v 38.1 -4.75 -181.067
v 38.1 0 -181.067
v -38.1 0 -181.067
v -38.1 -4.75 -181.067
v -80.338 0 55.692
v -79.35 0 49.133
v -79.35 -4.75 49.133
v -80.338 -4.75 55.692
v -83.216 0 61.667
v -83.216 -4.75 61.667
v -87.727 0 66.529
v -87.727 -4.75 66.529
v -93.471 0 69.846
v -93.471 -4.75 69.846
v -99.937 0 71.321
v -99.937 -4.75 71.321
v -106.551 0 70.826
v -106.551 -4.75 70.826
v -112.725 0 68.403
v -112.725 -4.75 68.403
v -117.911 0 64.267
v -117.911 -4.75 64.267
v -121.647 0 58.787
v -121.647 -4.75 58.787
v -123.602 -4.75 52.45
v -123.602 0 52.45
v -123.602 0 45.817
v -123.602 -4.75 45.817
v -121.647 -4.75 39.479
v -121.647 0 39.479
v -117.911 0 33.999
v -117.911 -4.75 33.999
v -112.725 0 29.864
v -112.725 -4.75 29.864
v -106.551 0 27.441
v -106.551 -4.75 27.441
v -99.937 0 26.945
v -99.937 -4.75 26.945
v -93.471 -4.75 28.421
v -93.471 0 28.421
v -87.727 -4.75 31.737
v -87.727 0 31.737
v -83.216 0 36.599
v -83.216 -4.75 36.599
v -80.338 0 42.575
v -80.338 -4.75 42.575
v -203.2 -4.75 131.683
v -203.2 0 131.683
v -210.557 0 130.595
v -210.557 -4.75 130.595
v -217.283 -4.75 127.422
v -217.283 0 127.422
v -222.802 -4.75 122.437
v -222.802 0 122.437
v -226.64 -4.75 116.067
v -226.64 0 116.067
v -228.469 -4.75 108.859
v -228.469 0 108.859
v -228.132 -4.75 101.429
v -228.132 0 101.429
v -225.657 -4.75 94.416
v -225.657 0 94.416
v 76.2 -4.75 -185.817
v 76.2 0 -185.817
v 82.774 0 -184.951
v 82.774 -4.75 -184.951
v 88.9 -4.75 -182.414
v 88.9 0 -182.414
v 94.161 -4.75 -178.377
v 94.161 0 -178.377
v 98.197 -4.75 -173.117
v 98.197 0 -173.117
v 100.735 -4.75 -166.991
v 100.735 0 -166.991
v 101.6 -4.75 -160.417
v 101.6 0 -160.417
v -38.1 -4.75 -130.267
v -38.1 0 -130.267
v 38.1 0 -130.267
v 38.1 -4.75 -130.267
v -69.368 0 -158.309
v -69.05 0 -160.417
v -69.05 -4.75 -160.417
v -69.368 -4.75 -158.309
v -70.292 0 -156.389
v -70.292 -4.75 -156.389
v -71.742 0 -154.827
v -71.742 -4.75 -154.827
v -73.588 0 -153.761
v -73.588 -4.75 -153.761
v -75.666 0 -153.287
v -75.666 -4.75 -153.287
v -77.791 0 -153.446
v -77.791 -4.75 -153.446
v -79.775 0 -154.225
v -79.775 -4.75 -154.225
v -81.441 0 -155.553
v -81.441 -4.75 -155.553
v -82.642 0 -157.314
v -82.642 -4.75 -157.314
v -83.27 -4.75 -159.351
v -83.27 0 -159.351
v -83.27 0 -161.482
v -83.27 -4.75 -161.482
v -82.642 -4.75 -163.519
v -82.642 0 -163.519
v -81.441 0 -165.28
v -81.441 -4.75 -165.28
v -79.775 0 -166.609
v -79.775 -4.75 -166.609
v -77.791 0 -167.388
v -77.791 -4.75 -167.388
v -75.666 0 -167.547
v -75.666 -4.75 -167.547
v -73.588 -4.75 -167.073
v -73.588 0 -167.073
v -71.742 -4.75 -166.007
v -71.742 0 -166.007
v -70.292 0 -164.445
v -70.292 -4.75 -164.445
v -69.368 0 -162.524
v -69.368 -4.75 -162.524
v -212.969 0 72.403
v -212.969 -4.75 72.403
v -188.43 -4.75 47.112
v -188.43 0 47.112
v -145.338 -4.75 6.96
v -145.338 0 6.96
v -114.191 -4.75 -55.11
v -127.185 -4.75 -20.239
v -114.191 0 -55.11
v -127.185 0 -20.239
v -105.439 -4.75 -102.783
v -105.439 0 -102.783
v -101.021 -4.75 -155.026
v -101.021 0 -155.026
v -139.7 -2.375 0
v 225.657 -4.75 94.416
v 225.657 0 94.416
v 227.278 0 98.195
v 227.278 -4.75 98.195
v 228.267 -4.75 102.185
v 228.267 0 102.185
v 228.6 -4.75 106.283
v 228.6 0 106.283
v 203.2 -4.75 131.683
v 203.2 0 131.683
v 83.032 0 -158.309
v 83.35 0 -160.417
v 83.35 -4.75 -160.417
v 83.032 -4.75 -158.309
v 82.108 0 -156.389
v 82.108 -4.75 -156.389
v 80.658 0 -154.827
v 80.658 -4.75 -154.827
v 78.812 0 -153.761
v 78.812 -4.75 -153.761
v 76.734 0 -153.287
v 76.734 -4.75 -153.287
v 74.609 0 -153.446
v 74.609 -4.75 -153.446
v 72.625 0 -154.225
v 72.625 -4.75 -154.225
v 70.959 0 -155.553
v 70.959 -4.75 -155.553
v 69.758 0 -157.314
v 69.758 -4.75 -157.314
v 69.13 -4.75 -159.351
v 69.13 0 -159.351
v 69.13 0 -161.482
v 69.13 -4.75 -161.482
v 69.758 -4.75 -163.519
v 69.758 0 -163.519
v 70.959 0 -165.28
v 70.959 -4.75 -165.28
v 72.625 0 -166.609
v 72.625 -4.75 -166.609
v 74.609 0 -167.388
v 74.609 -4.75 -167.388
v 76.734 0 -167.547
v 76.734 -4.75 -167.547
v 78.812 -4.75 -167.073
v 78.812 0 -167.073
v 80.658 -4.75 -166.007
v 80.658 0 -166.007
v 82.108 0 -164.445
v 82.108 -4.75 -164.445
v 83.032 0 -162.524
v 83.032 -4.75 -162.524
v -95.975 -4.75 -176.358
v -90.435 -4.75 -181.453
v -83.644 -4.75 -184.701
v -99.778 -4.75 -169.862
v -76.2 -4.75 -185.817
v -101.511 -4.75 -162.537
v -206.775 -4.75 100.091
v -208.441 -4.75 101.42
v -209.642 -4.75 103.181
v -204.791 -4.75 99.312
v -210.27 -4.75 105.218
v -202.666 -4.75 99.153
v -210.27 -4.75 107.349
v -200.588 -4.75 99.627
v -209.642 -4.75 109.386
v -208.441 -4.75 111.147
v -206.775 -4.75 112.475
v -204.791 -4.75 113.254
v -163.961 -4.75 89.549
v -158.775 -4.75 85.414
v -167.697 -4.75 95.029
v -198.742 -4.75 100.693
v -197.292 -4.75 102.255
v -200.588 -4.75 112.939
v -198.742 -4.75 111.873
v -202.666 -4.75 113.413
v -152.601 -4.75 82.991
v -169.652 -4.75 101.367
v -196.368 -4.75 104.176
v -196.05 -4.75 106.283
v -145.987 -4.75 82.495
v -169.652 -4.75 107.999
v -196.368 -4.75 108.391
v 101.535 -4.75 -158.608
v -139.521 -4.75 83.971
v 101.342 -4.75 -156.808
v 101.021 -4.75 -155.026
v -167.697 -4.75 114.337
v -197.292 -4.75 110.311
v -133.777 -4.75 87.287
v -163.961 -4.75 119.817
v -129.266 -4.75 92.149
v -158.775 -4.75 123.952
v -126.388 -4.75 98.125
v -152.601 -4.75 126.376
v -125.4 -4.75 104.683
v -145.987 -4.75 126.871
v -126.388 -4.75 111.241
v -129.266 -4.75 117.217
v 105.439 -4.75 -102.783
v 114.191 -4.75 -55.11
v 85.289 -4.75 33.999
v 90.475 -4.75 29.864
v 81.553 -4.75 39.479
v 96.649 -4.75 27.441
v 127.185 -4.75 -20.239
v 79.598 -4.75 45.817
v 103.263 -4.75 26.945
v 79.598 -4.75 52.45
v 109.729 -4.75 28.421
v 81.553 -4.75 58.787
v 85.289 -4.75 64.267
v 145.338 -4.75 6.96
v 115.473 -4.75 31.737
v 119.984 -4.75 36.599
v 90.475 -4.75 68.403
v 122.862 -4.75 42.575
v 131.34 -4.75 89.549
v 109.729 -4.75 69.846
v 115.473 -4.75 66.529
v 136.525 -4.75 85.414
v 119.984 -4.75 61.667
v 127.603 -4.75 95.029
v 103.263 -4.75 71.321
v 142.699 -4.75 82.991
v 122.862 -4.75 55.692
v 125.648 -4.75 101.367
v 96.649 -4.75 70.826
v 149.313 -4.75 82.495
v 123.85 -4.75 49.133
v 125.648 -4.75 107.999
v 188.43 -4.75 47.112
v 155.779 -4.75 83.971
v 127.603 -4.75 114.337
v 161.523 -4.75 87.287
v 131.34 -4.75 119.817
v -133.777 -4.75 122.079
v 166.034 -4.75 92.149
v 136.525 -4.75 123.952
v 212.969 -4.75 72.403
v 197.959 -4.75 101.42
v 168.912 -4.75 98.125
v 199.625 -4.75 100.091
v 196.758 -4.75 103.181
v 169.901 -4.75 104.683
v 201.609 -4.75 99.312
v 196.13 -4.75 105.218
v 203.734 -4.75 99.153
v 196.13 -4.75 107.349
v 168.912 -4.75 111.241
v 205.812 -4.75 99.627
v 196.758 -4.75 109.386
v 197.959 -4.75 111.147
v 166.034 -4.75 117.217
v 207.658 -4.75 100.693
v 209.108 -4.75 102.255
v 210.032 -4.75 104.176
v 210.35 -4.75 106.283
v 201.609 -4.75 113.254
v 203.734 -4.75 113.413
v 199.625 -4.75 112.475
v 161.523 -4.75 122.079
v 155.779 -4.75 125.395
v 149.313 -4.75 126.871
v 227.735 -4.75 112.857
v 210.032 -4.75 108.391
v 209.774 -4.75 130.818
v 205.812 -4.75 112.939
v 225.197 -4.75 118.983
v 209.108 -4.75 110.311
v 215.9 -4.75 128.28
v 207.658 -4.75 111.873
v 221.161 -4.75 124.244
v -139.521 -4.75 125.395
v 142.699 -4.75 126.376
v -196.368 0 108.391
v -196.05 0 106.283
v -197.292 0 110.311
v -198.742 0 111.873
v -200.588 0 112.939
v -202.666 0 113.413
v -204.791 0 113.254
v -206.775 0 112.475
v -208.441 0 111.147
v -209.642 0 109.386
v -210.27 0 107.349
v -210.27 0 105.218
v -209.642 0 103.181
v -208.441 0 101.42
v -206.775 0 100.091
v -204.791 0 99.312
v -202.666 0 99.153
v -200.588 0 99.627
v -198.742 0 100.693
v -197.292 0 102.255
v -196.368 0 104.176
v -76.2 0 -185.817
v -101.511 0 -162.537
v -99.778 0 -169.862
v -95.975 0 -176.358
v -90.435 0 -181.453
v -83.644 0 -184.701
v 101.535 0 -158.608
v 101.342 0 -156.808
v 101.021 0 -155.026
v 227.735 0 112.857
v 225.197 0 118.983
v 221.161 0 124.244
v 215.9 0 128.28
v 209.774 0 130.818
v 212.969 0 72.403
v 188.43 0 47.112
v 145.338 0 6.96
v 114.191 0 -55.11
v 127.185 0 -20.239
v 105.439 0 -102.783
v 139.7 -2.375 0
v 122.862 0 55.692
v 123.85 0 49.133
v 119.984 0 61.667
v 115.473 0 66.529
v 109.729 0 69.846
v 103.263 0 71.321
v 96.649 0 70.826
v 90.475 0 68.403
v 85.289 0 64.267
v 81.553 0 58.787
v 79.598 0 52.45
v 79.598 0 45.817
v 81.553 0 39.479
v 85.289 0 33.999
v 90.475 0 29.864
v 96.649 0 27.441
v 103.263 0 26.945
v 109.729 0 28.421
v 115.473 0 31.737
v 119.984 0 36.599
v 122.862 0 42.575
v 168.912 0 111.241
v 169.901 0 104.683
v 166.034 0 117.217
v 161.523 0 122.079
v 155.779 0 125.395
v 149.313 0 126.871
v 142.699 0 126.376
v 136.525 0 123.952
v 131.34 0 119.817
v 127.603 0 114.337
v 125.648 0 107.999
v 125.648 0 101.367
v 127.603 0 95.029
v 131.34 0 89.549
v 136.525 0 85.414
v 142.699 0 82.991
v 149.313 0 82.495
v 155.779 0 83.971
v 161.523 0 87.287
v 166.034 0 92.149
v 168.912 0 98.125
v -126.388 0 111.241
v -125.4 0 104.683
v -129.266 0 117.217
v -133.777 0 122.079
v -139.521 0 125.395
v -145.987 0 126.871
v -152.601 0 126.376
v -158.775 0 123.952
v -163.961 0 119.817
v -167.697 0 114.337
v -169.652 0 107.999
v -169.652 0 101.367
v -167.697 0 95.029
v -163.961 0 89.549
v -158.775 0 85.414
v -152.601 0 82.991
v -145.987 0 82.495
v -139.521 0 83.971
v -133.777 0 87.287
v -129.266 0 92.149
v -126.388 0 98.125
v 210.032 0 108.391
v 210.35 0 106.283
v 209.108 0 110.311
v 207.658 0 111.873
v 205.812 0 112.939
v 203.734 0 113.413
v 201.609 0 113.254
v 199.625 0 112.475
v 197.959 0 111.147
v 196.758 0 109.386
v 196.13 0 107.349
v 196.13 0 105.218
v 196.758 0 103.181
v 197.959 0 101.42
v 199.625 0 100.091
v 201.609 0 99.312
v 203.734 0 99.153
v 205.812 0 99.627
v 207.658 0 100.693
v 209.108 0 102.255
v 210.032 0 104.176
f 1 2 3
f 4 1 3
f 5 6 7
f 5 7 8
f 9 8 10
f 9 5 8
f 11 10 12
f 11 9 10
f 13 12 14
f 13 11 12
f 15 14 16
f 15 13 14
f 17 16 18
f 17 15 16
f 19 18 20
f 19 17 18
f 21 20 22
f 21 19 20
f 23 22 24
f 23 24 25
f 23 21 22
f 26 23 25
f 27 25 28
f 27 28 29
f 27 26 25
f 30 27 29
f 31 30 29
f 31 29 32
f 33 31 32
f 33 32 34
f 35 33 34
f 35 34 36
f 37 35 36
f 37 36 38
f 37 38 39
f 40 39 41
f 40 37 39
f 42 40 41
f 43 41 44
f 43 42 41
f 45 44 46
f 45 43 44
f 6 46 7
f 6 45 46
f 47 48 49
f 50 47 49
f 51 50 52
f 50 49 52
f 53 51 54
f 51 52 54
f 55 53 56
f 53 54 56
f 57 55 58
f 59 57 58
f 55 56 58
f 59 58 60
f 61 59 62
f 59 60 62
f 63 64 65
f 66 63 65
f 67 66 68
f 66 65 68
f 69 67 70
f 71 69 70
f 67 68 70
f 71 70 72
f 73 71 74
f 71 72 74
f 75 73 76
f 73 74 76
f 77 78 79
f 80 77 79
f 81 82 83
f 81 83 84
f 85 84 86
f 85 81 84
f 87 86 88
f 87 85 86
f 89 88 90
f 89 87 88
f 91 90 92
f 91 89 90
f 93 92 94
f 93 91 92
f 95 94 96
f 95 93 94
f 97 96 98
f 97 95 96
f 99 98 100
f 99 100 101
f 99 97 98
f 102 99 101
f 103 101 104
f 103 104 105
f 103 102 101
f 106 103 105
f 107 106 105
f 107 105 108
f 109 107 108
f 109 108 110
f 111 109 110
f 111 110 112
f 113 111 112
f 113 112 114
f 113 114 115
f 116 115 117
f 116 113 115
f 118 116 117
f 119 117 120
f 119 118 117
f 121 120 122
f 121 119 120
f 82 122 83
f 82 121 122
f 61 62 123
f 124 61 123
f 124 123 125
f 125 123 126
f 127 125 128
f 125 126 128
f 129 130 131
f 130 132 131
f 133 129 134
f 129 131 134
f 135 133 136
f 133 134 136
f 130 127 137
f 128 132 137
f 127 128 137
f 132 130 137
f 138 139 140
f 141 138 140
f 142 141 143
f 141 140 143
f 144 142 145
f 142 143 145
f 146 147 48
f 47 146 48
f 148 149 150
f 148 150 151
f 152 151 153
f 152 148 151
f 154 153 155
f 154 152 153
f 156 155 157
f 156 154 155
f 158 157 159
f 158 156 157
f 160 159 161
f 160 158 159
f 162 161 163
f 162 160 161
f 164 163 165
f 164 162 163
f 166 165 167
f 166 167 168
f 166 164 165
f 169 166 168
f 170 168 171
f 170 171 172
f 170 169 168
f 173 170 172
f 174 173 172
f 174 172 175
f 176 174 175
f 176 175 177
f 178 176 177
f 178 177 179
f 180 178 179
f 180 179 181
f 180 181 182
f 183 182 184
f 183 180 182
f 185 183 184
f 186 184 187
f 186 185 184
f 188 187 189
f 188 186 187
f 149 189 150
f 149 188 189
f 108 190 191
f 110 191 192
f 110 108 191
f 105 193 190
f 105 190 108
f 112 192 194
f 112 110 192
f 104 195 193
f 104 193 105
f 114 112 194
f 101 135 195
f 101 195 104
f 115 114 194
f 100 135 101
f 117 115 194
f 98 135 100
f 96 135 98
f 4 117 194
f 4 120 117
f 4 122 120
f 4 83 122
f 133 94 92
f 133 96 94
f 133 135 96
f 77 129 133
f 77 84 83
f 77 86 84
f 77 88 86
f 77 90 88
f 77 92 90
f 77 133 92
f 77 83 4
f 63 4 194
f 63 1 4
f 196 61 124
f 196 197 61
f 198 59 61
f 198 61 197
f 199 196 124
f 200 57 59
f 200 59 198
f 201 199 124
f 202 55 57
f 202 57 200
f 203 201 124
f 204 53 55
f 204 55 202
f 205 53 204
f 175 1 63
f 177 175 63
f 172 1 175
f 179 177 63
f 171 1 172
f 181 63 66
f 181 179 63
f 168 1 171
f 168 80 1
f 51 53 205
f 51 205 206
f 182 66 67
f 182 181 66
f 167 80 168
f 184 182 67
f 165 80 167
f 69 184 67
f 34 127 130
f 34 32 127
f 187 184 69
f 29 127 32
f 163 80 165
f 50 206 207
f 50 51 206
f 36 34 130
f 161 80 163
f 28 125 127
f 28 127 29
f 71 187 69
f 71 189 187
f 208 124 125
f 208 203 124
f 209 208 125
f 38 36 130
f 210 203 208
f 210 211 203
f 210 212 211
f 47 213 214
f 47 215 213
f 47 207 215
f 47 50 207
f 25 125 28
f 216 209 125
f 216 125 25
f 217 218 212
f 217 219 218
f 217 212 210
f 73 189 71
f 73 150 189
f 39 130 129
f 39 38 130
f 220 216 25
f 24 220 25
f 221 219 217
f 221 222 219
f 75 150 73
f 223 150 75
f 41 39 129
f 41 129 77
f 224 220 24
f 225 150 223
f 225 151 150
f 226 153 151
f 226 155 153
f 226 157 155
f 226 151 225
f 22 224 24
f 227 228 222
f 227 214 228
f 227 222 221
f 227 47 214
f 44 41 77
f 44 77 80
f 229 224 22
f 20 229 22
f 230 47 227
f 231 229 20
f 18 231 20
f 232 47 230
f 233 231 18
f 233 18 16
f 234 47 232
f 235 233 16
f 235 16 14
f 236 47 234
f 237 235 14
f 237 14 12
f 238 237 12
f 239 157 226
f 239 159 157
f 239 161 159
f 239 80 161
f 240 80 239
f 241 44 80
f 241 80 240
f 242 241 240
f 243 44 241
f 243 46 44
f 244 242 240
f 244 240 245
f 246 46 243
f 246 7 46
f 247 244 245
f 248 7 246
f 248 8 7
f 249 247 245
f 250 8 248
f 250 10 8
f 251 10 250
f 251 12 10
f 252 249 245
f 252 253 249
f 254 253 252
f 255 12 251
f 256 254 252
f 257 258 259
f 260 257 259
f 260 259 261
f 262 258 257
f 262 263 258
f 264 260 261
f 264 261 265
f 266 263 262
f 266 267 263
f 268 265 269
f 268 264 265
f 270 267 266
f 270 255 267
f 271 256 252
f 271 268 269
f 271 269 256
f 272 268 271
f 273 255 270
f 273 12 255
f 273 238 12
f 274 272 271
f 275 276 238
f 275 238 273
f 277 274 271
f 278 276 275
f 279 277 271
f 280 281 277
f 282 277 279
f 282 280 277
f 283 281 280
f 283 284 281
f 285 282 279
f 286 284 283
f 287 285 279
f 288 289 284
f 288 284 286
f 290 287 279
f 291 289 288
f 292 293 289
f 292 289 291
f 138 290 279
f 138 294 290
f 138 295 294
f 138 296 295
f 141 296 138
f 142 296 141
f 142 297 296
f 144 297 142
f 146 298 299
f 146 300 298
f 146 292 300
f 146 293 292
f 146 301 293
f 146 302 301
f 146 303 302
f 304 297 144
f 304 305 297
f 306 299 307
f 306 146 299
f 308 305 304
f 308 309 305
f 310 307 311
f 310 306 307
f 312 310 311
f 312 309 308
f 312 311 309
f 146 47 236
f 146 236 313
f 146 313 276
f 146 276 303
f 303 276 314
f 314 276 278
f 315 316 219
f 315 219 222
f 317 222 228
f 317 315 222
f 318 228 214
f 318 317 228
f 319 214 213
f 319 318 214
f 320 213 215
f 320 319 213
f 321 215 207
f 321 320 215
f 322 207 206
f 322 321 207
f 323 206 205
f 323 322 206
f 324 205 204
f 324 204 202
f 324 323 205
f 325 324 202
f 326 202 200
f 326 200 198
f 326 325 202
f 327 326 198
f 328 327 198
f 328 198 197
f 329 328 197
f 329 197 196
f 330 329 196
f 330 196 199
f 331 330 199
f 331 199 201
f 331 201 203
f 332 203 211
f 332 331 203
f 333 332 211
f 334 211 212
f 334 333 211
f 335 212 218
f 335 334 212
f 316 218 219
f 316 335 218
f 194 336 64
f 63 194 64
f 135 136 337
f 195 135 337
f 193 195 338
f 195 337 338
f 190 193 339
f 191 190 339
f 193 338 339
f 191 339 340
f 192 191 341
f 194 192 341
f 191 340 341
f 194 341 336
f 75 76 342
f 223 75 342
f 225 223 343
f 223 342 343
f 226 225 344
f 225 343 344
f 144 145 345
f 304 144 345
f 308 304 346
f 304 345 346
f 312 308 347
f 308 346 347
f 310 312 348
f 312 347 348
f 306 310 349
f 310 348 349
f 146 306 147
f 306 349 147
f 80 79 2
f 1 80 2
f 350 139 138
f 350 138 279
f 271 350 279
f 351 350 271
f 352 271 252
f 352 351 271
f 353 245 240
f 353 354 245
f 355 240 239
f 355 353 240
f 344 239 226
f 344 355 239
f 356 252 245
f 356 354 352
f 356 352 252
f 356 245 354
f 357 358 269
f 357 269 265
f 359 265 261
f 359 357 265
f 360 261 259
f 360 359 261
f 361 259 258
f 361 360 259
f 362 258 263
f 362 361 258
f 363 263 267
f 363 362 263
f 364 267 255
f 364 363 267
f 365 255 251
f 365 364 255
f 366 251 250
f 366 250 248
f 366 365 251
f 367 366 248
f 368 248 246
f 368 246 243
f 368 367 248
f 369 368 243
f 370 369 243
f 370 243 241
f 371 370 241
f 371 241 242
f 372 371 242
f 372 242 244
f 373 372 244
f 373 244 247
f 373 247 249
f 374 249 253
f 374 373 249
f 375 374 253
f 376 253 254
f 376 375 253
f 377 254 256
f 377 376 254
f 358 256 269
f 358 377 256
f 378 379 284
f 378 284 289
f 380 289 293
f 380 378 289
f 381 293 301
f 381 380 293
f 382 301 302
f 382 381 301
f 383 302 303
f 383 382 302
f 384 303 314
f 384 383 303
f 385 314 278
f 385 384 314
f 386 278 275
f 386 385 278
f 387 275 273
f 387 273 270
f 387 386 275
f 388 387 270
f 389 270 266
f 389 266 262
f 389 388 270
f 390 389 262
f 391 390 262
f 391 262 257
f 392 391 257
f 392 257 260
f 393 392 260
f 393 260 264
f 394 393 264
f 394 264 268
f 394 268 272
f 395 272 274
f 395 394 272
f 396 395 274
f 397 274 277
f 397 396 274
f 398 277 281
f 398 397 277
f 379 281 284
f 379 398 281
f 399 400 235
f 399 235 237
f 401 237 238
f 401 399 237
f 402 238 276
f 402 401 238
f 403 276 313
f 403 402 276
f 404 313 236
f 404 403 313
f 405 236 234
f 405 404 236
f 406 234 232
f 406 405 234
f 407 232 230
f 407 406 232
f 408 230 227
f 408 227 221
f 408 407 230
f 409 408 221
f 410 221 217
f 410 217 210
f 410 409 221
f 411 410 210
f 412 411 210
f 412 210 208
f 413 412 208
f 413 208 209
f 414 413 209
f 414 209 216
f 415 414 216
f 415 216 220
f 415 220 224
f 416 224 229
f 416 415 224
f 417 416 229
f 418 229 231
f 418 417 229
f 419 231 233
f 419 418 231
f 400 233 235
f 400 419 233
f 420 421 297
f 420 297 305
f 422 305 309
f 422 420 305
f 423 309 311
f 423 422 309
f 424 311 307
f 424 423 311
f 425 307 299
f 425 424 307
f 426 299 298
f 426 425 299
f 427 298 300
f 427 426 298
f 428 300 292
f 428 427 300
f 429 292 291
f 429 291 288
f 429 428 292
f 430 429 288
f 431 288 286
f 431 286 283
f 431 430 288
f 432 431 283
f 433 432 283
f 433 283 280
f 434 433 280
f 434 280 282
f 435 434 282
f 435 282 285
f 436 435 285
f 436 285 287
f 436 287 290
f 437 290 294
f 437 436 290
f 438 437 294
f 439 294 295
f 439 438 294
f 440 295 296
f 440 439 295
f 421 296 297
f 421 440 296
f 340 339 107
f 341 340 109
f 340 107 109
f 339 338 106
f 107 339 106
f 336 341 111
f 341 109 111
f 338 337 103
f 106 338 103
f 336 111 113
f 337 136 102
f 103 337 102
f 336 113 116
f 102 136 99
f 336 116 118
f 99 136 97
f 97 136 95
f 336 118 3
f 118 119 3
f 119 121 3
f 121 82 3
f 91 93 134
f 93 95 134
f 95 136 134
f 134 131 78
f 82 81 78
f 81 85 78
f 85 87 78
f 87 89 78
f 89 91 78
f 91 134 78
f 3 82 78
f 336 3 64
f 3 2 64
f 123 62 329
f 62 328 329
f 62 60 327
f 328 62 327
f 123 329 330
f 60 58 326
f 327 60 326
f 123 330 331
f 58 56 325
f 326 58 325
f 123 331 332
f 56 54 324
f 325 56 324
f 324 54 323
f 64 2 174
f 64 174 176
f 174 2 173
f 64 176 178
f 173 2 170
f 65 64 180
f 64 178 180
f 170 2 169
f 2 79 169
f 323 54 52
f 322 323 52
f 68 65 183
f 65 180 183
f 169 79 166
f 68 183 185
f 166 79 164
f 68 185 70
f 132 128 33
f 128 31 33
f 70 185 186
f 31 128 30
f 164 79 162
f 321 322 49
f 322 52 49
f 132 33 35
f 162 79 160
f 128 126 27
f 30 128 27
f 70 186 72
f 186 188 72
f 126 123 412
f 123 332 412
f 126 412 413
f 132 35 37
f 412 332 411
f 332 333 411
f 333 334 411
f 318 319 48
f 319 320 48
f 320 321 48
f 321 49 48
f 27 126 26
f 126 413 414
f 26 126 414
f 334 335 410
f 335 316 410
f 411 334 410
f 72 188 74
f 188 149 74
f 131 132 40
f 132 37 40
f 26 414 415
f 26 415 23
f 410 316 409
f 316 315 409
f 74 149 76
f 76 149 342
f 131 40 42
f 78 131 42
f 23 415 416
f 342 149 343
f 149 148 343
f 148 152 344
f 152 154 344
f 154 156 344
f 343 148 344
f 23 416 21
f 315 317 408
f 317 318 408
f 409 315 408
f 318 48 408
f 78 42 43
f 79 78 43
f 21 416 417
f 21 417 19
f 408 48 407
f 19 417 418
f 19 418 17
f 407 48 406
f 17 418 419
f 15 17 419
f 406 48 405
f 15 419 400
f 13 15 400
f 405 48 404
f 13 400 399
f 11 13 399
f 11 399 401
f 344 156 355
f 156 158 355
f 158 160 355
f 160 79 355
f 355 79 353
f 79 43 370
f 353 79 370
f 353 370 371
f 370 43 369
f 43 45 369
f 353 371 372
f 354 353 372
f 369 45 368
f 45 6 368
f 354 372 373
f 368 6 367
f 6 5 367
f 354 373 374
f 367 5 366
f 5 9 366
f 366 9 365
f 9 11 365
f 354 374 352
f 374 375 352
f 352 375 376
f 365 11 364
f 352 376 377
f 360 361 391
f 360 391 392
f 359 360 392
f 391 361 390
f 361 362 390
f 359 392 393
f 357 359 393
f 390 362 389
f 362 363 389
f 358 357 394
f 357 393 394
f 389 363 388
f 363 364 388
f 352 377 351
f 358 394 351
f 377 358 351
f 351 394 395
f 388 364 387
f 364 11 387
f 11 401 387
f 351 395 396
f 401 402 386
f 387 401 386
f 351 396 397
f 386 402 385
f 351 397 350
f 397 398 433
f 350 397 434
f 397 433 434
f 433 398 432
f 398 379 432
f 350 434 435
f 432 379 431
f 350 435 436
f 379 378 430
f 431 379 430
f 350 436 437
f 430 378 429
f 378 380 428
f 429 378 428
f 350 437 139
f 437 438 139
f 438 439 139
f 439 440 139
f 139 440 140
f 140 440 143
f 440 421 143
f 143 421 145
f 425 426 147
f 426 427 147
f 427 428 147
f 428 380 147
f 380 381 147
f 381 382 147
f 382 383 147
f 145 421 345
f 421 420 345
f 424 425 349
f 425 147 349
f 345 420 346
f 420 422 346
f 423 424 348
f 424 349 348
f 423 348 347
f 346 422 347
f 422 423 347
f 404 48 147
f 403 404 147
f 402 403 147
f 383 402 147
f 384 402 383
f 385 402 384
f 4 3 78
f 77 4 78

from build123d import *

# Parameters (mm, degrees)
F0_R     = 7.1501
F0_R_2   = 22.2504
F1_DEPTH = 4.7498


with BuildPart() as f1:
    # F0 (on Front) → F1 (new body)
    with BuildSketch(Plane.XZ):
        with BuildLine():
            ThreePointArc((-225.6573369788, 94.4161567678), (-197.0867504248, 81.6298943923), (-177.8, 106.2832548048))
            ThreePointArc((-177.8, 106.2832548048), (-185.2394877579, 124.2437670469), (-203.2, 131.6832548048))
            ThreePointArc((-203.2, 131.6832548048), (-224.9552785565, 119.3930929018), (-225.6573369788, 94.4161567678))
        make_face()
        with Locations((-203.2, 106.2832548048)):
            Circle(F0_R, mode=Mode.SUBTRACT)
        with BuildLine():
            ThreePointArc((-203.2, 131.6832548048), (-185.2394877579, 124.2437670469), (-177.8, 106.2832548048))
            ThreePointArc((-177.8, 106.2832548048), (-197.0867504248, 81.6298943923), (-225.6573369788, 94.4161567678))
            add(Edge.make_bspline(
                [(-225.6573369788, 94.4161567678), (-210.8833649868, 55.9874046479), (-115.4710726931, 10.7964254469), (-104.8309285082, -94.2151341667), (-101.0213270695, -155.0258526432)],
                knots=[0, 0, 0, 0, 0.4720003547, 1, 1, 1, 1], degree=3))
            ThreePointArc((-101.0213270695, -155.0258526432), (-73.4890691235, -135.1618277773), (-50.8, -160.4167451952))
            ThreePointArc((-50.8, -160.4167451952), (-58.2394877579, -178.3772574373), (-76.2, -185.8167451952))
            Line((-76.2, -185.8167451952), (76.2, -185.8167451952))
            ThreePointArc((76.2, -185.8167451952), (56.4251590294, -144.4757394368), (101.0213270695, -155.0258526432))
            add(Edge.make_bspline(
                [(225.6573369788, 94.4161567678), (210.8833649868, 55.9874046479), (115.4710726931, 10.7964254469), (104.8309285082, -94.2151341667), (101.0213270695, -155.0258526432)],
                knots=[0, 0, 0, 0, 0.4720003547, 1, 1, 1, 1], degree=3))
            ThreePointArc((225.6573369788, 94.4161567678), (181.4447214435, 93.1734167078), (203.2, 131.6832548048))
            Line((203.2, 131.6832548048), (-203.2, 131.6832548048))
        make_face()
        Polygon((-38.1, -130.2669451952), (0, -130.2669451952), (38.1, -130.2669451952), (38.1, -181.0669451952), (0, -181.0669451952), (-38.1, -181.0669451952), align=None, mode=Mode.SUBTRACT)
        with Locations((-101.6, 49.1332548048)):
            Circle(F0_R_2, mode=Mode.SUBTRACT)
        with Locations((-147.6502, 104.6830548048)):
            Circle(F0_R_2, mode=Mode.SUBTRACT)
        with Locations((101.6, 49.1332548048)):
            Circle(F0_R_2, mode=Mode.SUBTRACT)
        with Locations((147.6502, 104.6830548048)):
            Circle(F0_R_2, mode=Mode.SUBTRACT)
        with BuildLine():
            ThreePointArc((228.6, 106.2832548048), (221.1605122421, 124.2437670469), (203.2, 131.6832548048))
            ThreePointArc((203.2, 131.6832548048), (181.4447214435, 93.1734167078), (225.6573369788, 94.4161567678))
            ThreePointArc((225.6573369788, 94.4161567678), (227.8533604125, 100.1700052296), (228.6, 106.2832548048))
        make_face()
        with Locations((203.2, 106.2832548048)):
            Circle(F0_R, mode=Mode.SUBTRACT)
        with BuildLine():
            ThreePointArc((-50.8, -160.4167451952), (-73.4890691235, -135.1618277773), (-101.0213270695, -155.0258526432))
            ThreePointArc((-101.0213270695, -155.0258526432), (-95.9748409706, -176.3577509536), (-76.2, -185.8167451952))
            ThreePointArc((-76.2, -185.8167451952), (-58.2394877579, -178.3772574373), (-50.8, -160.4167451952))
        make_face()
        with Locations((-76.2, -160.4167451952)):
            Circle(F0_R, mode=Mode.SUBTRACT)
        with BuildLine():
            ThreePointArc((101.6, -160.4167451952), (101.4549174179, -157.7058143187), (101.0213270695, -155.0258526432))
            ThreePointArc((101.0213270695, -155.0258526432), (56.4251590294, -144.4757394368), (76.2, -185.8167451952))
            ThreePointArc((76.2, -185.8167451952), (94.1605122421, -178.3772574373), (101.6, -160.4167451952))
        make_face()
        with Locations((76.2, -160.4167451952)):
            Circle(F0_R, mode=Mode.SUBTRACT)
    extrude(amount=F1_DEPTH)


solid = f1.part
